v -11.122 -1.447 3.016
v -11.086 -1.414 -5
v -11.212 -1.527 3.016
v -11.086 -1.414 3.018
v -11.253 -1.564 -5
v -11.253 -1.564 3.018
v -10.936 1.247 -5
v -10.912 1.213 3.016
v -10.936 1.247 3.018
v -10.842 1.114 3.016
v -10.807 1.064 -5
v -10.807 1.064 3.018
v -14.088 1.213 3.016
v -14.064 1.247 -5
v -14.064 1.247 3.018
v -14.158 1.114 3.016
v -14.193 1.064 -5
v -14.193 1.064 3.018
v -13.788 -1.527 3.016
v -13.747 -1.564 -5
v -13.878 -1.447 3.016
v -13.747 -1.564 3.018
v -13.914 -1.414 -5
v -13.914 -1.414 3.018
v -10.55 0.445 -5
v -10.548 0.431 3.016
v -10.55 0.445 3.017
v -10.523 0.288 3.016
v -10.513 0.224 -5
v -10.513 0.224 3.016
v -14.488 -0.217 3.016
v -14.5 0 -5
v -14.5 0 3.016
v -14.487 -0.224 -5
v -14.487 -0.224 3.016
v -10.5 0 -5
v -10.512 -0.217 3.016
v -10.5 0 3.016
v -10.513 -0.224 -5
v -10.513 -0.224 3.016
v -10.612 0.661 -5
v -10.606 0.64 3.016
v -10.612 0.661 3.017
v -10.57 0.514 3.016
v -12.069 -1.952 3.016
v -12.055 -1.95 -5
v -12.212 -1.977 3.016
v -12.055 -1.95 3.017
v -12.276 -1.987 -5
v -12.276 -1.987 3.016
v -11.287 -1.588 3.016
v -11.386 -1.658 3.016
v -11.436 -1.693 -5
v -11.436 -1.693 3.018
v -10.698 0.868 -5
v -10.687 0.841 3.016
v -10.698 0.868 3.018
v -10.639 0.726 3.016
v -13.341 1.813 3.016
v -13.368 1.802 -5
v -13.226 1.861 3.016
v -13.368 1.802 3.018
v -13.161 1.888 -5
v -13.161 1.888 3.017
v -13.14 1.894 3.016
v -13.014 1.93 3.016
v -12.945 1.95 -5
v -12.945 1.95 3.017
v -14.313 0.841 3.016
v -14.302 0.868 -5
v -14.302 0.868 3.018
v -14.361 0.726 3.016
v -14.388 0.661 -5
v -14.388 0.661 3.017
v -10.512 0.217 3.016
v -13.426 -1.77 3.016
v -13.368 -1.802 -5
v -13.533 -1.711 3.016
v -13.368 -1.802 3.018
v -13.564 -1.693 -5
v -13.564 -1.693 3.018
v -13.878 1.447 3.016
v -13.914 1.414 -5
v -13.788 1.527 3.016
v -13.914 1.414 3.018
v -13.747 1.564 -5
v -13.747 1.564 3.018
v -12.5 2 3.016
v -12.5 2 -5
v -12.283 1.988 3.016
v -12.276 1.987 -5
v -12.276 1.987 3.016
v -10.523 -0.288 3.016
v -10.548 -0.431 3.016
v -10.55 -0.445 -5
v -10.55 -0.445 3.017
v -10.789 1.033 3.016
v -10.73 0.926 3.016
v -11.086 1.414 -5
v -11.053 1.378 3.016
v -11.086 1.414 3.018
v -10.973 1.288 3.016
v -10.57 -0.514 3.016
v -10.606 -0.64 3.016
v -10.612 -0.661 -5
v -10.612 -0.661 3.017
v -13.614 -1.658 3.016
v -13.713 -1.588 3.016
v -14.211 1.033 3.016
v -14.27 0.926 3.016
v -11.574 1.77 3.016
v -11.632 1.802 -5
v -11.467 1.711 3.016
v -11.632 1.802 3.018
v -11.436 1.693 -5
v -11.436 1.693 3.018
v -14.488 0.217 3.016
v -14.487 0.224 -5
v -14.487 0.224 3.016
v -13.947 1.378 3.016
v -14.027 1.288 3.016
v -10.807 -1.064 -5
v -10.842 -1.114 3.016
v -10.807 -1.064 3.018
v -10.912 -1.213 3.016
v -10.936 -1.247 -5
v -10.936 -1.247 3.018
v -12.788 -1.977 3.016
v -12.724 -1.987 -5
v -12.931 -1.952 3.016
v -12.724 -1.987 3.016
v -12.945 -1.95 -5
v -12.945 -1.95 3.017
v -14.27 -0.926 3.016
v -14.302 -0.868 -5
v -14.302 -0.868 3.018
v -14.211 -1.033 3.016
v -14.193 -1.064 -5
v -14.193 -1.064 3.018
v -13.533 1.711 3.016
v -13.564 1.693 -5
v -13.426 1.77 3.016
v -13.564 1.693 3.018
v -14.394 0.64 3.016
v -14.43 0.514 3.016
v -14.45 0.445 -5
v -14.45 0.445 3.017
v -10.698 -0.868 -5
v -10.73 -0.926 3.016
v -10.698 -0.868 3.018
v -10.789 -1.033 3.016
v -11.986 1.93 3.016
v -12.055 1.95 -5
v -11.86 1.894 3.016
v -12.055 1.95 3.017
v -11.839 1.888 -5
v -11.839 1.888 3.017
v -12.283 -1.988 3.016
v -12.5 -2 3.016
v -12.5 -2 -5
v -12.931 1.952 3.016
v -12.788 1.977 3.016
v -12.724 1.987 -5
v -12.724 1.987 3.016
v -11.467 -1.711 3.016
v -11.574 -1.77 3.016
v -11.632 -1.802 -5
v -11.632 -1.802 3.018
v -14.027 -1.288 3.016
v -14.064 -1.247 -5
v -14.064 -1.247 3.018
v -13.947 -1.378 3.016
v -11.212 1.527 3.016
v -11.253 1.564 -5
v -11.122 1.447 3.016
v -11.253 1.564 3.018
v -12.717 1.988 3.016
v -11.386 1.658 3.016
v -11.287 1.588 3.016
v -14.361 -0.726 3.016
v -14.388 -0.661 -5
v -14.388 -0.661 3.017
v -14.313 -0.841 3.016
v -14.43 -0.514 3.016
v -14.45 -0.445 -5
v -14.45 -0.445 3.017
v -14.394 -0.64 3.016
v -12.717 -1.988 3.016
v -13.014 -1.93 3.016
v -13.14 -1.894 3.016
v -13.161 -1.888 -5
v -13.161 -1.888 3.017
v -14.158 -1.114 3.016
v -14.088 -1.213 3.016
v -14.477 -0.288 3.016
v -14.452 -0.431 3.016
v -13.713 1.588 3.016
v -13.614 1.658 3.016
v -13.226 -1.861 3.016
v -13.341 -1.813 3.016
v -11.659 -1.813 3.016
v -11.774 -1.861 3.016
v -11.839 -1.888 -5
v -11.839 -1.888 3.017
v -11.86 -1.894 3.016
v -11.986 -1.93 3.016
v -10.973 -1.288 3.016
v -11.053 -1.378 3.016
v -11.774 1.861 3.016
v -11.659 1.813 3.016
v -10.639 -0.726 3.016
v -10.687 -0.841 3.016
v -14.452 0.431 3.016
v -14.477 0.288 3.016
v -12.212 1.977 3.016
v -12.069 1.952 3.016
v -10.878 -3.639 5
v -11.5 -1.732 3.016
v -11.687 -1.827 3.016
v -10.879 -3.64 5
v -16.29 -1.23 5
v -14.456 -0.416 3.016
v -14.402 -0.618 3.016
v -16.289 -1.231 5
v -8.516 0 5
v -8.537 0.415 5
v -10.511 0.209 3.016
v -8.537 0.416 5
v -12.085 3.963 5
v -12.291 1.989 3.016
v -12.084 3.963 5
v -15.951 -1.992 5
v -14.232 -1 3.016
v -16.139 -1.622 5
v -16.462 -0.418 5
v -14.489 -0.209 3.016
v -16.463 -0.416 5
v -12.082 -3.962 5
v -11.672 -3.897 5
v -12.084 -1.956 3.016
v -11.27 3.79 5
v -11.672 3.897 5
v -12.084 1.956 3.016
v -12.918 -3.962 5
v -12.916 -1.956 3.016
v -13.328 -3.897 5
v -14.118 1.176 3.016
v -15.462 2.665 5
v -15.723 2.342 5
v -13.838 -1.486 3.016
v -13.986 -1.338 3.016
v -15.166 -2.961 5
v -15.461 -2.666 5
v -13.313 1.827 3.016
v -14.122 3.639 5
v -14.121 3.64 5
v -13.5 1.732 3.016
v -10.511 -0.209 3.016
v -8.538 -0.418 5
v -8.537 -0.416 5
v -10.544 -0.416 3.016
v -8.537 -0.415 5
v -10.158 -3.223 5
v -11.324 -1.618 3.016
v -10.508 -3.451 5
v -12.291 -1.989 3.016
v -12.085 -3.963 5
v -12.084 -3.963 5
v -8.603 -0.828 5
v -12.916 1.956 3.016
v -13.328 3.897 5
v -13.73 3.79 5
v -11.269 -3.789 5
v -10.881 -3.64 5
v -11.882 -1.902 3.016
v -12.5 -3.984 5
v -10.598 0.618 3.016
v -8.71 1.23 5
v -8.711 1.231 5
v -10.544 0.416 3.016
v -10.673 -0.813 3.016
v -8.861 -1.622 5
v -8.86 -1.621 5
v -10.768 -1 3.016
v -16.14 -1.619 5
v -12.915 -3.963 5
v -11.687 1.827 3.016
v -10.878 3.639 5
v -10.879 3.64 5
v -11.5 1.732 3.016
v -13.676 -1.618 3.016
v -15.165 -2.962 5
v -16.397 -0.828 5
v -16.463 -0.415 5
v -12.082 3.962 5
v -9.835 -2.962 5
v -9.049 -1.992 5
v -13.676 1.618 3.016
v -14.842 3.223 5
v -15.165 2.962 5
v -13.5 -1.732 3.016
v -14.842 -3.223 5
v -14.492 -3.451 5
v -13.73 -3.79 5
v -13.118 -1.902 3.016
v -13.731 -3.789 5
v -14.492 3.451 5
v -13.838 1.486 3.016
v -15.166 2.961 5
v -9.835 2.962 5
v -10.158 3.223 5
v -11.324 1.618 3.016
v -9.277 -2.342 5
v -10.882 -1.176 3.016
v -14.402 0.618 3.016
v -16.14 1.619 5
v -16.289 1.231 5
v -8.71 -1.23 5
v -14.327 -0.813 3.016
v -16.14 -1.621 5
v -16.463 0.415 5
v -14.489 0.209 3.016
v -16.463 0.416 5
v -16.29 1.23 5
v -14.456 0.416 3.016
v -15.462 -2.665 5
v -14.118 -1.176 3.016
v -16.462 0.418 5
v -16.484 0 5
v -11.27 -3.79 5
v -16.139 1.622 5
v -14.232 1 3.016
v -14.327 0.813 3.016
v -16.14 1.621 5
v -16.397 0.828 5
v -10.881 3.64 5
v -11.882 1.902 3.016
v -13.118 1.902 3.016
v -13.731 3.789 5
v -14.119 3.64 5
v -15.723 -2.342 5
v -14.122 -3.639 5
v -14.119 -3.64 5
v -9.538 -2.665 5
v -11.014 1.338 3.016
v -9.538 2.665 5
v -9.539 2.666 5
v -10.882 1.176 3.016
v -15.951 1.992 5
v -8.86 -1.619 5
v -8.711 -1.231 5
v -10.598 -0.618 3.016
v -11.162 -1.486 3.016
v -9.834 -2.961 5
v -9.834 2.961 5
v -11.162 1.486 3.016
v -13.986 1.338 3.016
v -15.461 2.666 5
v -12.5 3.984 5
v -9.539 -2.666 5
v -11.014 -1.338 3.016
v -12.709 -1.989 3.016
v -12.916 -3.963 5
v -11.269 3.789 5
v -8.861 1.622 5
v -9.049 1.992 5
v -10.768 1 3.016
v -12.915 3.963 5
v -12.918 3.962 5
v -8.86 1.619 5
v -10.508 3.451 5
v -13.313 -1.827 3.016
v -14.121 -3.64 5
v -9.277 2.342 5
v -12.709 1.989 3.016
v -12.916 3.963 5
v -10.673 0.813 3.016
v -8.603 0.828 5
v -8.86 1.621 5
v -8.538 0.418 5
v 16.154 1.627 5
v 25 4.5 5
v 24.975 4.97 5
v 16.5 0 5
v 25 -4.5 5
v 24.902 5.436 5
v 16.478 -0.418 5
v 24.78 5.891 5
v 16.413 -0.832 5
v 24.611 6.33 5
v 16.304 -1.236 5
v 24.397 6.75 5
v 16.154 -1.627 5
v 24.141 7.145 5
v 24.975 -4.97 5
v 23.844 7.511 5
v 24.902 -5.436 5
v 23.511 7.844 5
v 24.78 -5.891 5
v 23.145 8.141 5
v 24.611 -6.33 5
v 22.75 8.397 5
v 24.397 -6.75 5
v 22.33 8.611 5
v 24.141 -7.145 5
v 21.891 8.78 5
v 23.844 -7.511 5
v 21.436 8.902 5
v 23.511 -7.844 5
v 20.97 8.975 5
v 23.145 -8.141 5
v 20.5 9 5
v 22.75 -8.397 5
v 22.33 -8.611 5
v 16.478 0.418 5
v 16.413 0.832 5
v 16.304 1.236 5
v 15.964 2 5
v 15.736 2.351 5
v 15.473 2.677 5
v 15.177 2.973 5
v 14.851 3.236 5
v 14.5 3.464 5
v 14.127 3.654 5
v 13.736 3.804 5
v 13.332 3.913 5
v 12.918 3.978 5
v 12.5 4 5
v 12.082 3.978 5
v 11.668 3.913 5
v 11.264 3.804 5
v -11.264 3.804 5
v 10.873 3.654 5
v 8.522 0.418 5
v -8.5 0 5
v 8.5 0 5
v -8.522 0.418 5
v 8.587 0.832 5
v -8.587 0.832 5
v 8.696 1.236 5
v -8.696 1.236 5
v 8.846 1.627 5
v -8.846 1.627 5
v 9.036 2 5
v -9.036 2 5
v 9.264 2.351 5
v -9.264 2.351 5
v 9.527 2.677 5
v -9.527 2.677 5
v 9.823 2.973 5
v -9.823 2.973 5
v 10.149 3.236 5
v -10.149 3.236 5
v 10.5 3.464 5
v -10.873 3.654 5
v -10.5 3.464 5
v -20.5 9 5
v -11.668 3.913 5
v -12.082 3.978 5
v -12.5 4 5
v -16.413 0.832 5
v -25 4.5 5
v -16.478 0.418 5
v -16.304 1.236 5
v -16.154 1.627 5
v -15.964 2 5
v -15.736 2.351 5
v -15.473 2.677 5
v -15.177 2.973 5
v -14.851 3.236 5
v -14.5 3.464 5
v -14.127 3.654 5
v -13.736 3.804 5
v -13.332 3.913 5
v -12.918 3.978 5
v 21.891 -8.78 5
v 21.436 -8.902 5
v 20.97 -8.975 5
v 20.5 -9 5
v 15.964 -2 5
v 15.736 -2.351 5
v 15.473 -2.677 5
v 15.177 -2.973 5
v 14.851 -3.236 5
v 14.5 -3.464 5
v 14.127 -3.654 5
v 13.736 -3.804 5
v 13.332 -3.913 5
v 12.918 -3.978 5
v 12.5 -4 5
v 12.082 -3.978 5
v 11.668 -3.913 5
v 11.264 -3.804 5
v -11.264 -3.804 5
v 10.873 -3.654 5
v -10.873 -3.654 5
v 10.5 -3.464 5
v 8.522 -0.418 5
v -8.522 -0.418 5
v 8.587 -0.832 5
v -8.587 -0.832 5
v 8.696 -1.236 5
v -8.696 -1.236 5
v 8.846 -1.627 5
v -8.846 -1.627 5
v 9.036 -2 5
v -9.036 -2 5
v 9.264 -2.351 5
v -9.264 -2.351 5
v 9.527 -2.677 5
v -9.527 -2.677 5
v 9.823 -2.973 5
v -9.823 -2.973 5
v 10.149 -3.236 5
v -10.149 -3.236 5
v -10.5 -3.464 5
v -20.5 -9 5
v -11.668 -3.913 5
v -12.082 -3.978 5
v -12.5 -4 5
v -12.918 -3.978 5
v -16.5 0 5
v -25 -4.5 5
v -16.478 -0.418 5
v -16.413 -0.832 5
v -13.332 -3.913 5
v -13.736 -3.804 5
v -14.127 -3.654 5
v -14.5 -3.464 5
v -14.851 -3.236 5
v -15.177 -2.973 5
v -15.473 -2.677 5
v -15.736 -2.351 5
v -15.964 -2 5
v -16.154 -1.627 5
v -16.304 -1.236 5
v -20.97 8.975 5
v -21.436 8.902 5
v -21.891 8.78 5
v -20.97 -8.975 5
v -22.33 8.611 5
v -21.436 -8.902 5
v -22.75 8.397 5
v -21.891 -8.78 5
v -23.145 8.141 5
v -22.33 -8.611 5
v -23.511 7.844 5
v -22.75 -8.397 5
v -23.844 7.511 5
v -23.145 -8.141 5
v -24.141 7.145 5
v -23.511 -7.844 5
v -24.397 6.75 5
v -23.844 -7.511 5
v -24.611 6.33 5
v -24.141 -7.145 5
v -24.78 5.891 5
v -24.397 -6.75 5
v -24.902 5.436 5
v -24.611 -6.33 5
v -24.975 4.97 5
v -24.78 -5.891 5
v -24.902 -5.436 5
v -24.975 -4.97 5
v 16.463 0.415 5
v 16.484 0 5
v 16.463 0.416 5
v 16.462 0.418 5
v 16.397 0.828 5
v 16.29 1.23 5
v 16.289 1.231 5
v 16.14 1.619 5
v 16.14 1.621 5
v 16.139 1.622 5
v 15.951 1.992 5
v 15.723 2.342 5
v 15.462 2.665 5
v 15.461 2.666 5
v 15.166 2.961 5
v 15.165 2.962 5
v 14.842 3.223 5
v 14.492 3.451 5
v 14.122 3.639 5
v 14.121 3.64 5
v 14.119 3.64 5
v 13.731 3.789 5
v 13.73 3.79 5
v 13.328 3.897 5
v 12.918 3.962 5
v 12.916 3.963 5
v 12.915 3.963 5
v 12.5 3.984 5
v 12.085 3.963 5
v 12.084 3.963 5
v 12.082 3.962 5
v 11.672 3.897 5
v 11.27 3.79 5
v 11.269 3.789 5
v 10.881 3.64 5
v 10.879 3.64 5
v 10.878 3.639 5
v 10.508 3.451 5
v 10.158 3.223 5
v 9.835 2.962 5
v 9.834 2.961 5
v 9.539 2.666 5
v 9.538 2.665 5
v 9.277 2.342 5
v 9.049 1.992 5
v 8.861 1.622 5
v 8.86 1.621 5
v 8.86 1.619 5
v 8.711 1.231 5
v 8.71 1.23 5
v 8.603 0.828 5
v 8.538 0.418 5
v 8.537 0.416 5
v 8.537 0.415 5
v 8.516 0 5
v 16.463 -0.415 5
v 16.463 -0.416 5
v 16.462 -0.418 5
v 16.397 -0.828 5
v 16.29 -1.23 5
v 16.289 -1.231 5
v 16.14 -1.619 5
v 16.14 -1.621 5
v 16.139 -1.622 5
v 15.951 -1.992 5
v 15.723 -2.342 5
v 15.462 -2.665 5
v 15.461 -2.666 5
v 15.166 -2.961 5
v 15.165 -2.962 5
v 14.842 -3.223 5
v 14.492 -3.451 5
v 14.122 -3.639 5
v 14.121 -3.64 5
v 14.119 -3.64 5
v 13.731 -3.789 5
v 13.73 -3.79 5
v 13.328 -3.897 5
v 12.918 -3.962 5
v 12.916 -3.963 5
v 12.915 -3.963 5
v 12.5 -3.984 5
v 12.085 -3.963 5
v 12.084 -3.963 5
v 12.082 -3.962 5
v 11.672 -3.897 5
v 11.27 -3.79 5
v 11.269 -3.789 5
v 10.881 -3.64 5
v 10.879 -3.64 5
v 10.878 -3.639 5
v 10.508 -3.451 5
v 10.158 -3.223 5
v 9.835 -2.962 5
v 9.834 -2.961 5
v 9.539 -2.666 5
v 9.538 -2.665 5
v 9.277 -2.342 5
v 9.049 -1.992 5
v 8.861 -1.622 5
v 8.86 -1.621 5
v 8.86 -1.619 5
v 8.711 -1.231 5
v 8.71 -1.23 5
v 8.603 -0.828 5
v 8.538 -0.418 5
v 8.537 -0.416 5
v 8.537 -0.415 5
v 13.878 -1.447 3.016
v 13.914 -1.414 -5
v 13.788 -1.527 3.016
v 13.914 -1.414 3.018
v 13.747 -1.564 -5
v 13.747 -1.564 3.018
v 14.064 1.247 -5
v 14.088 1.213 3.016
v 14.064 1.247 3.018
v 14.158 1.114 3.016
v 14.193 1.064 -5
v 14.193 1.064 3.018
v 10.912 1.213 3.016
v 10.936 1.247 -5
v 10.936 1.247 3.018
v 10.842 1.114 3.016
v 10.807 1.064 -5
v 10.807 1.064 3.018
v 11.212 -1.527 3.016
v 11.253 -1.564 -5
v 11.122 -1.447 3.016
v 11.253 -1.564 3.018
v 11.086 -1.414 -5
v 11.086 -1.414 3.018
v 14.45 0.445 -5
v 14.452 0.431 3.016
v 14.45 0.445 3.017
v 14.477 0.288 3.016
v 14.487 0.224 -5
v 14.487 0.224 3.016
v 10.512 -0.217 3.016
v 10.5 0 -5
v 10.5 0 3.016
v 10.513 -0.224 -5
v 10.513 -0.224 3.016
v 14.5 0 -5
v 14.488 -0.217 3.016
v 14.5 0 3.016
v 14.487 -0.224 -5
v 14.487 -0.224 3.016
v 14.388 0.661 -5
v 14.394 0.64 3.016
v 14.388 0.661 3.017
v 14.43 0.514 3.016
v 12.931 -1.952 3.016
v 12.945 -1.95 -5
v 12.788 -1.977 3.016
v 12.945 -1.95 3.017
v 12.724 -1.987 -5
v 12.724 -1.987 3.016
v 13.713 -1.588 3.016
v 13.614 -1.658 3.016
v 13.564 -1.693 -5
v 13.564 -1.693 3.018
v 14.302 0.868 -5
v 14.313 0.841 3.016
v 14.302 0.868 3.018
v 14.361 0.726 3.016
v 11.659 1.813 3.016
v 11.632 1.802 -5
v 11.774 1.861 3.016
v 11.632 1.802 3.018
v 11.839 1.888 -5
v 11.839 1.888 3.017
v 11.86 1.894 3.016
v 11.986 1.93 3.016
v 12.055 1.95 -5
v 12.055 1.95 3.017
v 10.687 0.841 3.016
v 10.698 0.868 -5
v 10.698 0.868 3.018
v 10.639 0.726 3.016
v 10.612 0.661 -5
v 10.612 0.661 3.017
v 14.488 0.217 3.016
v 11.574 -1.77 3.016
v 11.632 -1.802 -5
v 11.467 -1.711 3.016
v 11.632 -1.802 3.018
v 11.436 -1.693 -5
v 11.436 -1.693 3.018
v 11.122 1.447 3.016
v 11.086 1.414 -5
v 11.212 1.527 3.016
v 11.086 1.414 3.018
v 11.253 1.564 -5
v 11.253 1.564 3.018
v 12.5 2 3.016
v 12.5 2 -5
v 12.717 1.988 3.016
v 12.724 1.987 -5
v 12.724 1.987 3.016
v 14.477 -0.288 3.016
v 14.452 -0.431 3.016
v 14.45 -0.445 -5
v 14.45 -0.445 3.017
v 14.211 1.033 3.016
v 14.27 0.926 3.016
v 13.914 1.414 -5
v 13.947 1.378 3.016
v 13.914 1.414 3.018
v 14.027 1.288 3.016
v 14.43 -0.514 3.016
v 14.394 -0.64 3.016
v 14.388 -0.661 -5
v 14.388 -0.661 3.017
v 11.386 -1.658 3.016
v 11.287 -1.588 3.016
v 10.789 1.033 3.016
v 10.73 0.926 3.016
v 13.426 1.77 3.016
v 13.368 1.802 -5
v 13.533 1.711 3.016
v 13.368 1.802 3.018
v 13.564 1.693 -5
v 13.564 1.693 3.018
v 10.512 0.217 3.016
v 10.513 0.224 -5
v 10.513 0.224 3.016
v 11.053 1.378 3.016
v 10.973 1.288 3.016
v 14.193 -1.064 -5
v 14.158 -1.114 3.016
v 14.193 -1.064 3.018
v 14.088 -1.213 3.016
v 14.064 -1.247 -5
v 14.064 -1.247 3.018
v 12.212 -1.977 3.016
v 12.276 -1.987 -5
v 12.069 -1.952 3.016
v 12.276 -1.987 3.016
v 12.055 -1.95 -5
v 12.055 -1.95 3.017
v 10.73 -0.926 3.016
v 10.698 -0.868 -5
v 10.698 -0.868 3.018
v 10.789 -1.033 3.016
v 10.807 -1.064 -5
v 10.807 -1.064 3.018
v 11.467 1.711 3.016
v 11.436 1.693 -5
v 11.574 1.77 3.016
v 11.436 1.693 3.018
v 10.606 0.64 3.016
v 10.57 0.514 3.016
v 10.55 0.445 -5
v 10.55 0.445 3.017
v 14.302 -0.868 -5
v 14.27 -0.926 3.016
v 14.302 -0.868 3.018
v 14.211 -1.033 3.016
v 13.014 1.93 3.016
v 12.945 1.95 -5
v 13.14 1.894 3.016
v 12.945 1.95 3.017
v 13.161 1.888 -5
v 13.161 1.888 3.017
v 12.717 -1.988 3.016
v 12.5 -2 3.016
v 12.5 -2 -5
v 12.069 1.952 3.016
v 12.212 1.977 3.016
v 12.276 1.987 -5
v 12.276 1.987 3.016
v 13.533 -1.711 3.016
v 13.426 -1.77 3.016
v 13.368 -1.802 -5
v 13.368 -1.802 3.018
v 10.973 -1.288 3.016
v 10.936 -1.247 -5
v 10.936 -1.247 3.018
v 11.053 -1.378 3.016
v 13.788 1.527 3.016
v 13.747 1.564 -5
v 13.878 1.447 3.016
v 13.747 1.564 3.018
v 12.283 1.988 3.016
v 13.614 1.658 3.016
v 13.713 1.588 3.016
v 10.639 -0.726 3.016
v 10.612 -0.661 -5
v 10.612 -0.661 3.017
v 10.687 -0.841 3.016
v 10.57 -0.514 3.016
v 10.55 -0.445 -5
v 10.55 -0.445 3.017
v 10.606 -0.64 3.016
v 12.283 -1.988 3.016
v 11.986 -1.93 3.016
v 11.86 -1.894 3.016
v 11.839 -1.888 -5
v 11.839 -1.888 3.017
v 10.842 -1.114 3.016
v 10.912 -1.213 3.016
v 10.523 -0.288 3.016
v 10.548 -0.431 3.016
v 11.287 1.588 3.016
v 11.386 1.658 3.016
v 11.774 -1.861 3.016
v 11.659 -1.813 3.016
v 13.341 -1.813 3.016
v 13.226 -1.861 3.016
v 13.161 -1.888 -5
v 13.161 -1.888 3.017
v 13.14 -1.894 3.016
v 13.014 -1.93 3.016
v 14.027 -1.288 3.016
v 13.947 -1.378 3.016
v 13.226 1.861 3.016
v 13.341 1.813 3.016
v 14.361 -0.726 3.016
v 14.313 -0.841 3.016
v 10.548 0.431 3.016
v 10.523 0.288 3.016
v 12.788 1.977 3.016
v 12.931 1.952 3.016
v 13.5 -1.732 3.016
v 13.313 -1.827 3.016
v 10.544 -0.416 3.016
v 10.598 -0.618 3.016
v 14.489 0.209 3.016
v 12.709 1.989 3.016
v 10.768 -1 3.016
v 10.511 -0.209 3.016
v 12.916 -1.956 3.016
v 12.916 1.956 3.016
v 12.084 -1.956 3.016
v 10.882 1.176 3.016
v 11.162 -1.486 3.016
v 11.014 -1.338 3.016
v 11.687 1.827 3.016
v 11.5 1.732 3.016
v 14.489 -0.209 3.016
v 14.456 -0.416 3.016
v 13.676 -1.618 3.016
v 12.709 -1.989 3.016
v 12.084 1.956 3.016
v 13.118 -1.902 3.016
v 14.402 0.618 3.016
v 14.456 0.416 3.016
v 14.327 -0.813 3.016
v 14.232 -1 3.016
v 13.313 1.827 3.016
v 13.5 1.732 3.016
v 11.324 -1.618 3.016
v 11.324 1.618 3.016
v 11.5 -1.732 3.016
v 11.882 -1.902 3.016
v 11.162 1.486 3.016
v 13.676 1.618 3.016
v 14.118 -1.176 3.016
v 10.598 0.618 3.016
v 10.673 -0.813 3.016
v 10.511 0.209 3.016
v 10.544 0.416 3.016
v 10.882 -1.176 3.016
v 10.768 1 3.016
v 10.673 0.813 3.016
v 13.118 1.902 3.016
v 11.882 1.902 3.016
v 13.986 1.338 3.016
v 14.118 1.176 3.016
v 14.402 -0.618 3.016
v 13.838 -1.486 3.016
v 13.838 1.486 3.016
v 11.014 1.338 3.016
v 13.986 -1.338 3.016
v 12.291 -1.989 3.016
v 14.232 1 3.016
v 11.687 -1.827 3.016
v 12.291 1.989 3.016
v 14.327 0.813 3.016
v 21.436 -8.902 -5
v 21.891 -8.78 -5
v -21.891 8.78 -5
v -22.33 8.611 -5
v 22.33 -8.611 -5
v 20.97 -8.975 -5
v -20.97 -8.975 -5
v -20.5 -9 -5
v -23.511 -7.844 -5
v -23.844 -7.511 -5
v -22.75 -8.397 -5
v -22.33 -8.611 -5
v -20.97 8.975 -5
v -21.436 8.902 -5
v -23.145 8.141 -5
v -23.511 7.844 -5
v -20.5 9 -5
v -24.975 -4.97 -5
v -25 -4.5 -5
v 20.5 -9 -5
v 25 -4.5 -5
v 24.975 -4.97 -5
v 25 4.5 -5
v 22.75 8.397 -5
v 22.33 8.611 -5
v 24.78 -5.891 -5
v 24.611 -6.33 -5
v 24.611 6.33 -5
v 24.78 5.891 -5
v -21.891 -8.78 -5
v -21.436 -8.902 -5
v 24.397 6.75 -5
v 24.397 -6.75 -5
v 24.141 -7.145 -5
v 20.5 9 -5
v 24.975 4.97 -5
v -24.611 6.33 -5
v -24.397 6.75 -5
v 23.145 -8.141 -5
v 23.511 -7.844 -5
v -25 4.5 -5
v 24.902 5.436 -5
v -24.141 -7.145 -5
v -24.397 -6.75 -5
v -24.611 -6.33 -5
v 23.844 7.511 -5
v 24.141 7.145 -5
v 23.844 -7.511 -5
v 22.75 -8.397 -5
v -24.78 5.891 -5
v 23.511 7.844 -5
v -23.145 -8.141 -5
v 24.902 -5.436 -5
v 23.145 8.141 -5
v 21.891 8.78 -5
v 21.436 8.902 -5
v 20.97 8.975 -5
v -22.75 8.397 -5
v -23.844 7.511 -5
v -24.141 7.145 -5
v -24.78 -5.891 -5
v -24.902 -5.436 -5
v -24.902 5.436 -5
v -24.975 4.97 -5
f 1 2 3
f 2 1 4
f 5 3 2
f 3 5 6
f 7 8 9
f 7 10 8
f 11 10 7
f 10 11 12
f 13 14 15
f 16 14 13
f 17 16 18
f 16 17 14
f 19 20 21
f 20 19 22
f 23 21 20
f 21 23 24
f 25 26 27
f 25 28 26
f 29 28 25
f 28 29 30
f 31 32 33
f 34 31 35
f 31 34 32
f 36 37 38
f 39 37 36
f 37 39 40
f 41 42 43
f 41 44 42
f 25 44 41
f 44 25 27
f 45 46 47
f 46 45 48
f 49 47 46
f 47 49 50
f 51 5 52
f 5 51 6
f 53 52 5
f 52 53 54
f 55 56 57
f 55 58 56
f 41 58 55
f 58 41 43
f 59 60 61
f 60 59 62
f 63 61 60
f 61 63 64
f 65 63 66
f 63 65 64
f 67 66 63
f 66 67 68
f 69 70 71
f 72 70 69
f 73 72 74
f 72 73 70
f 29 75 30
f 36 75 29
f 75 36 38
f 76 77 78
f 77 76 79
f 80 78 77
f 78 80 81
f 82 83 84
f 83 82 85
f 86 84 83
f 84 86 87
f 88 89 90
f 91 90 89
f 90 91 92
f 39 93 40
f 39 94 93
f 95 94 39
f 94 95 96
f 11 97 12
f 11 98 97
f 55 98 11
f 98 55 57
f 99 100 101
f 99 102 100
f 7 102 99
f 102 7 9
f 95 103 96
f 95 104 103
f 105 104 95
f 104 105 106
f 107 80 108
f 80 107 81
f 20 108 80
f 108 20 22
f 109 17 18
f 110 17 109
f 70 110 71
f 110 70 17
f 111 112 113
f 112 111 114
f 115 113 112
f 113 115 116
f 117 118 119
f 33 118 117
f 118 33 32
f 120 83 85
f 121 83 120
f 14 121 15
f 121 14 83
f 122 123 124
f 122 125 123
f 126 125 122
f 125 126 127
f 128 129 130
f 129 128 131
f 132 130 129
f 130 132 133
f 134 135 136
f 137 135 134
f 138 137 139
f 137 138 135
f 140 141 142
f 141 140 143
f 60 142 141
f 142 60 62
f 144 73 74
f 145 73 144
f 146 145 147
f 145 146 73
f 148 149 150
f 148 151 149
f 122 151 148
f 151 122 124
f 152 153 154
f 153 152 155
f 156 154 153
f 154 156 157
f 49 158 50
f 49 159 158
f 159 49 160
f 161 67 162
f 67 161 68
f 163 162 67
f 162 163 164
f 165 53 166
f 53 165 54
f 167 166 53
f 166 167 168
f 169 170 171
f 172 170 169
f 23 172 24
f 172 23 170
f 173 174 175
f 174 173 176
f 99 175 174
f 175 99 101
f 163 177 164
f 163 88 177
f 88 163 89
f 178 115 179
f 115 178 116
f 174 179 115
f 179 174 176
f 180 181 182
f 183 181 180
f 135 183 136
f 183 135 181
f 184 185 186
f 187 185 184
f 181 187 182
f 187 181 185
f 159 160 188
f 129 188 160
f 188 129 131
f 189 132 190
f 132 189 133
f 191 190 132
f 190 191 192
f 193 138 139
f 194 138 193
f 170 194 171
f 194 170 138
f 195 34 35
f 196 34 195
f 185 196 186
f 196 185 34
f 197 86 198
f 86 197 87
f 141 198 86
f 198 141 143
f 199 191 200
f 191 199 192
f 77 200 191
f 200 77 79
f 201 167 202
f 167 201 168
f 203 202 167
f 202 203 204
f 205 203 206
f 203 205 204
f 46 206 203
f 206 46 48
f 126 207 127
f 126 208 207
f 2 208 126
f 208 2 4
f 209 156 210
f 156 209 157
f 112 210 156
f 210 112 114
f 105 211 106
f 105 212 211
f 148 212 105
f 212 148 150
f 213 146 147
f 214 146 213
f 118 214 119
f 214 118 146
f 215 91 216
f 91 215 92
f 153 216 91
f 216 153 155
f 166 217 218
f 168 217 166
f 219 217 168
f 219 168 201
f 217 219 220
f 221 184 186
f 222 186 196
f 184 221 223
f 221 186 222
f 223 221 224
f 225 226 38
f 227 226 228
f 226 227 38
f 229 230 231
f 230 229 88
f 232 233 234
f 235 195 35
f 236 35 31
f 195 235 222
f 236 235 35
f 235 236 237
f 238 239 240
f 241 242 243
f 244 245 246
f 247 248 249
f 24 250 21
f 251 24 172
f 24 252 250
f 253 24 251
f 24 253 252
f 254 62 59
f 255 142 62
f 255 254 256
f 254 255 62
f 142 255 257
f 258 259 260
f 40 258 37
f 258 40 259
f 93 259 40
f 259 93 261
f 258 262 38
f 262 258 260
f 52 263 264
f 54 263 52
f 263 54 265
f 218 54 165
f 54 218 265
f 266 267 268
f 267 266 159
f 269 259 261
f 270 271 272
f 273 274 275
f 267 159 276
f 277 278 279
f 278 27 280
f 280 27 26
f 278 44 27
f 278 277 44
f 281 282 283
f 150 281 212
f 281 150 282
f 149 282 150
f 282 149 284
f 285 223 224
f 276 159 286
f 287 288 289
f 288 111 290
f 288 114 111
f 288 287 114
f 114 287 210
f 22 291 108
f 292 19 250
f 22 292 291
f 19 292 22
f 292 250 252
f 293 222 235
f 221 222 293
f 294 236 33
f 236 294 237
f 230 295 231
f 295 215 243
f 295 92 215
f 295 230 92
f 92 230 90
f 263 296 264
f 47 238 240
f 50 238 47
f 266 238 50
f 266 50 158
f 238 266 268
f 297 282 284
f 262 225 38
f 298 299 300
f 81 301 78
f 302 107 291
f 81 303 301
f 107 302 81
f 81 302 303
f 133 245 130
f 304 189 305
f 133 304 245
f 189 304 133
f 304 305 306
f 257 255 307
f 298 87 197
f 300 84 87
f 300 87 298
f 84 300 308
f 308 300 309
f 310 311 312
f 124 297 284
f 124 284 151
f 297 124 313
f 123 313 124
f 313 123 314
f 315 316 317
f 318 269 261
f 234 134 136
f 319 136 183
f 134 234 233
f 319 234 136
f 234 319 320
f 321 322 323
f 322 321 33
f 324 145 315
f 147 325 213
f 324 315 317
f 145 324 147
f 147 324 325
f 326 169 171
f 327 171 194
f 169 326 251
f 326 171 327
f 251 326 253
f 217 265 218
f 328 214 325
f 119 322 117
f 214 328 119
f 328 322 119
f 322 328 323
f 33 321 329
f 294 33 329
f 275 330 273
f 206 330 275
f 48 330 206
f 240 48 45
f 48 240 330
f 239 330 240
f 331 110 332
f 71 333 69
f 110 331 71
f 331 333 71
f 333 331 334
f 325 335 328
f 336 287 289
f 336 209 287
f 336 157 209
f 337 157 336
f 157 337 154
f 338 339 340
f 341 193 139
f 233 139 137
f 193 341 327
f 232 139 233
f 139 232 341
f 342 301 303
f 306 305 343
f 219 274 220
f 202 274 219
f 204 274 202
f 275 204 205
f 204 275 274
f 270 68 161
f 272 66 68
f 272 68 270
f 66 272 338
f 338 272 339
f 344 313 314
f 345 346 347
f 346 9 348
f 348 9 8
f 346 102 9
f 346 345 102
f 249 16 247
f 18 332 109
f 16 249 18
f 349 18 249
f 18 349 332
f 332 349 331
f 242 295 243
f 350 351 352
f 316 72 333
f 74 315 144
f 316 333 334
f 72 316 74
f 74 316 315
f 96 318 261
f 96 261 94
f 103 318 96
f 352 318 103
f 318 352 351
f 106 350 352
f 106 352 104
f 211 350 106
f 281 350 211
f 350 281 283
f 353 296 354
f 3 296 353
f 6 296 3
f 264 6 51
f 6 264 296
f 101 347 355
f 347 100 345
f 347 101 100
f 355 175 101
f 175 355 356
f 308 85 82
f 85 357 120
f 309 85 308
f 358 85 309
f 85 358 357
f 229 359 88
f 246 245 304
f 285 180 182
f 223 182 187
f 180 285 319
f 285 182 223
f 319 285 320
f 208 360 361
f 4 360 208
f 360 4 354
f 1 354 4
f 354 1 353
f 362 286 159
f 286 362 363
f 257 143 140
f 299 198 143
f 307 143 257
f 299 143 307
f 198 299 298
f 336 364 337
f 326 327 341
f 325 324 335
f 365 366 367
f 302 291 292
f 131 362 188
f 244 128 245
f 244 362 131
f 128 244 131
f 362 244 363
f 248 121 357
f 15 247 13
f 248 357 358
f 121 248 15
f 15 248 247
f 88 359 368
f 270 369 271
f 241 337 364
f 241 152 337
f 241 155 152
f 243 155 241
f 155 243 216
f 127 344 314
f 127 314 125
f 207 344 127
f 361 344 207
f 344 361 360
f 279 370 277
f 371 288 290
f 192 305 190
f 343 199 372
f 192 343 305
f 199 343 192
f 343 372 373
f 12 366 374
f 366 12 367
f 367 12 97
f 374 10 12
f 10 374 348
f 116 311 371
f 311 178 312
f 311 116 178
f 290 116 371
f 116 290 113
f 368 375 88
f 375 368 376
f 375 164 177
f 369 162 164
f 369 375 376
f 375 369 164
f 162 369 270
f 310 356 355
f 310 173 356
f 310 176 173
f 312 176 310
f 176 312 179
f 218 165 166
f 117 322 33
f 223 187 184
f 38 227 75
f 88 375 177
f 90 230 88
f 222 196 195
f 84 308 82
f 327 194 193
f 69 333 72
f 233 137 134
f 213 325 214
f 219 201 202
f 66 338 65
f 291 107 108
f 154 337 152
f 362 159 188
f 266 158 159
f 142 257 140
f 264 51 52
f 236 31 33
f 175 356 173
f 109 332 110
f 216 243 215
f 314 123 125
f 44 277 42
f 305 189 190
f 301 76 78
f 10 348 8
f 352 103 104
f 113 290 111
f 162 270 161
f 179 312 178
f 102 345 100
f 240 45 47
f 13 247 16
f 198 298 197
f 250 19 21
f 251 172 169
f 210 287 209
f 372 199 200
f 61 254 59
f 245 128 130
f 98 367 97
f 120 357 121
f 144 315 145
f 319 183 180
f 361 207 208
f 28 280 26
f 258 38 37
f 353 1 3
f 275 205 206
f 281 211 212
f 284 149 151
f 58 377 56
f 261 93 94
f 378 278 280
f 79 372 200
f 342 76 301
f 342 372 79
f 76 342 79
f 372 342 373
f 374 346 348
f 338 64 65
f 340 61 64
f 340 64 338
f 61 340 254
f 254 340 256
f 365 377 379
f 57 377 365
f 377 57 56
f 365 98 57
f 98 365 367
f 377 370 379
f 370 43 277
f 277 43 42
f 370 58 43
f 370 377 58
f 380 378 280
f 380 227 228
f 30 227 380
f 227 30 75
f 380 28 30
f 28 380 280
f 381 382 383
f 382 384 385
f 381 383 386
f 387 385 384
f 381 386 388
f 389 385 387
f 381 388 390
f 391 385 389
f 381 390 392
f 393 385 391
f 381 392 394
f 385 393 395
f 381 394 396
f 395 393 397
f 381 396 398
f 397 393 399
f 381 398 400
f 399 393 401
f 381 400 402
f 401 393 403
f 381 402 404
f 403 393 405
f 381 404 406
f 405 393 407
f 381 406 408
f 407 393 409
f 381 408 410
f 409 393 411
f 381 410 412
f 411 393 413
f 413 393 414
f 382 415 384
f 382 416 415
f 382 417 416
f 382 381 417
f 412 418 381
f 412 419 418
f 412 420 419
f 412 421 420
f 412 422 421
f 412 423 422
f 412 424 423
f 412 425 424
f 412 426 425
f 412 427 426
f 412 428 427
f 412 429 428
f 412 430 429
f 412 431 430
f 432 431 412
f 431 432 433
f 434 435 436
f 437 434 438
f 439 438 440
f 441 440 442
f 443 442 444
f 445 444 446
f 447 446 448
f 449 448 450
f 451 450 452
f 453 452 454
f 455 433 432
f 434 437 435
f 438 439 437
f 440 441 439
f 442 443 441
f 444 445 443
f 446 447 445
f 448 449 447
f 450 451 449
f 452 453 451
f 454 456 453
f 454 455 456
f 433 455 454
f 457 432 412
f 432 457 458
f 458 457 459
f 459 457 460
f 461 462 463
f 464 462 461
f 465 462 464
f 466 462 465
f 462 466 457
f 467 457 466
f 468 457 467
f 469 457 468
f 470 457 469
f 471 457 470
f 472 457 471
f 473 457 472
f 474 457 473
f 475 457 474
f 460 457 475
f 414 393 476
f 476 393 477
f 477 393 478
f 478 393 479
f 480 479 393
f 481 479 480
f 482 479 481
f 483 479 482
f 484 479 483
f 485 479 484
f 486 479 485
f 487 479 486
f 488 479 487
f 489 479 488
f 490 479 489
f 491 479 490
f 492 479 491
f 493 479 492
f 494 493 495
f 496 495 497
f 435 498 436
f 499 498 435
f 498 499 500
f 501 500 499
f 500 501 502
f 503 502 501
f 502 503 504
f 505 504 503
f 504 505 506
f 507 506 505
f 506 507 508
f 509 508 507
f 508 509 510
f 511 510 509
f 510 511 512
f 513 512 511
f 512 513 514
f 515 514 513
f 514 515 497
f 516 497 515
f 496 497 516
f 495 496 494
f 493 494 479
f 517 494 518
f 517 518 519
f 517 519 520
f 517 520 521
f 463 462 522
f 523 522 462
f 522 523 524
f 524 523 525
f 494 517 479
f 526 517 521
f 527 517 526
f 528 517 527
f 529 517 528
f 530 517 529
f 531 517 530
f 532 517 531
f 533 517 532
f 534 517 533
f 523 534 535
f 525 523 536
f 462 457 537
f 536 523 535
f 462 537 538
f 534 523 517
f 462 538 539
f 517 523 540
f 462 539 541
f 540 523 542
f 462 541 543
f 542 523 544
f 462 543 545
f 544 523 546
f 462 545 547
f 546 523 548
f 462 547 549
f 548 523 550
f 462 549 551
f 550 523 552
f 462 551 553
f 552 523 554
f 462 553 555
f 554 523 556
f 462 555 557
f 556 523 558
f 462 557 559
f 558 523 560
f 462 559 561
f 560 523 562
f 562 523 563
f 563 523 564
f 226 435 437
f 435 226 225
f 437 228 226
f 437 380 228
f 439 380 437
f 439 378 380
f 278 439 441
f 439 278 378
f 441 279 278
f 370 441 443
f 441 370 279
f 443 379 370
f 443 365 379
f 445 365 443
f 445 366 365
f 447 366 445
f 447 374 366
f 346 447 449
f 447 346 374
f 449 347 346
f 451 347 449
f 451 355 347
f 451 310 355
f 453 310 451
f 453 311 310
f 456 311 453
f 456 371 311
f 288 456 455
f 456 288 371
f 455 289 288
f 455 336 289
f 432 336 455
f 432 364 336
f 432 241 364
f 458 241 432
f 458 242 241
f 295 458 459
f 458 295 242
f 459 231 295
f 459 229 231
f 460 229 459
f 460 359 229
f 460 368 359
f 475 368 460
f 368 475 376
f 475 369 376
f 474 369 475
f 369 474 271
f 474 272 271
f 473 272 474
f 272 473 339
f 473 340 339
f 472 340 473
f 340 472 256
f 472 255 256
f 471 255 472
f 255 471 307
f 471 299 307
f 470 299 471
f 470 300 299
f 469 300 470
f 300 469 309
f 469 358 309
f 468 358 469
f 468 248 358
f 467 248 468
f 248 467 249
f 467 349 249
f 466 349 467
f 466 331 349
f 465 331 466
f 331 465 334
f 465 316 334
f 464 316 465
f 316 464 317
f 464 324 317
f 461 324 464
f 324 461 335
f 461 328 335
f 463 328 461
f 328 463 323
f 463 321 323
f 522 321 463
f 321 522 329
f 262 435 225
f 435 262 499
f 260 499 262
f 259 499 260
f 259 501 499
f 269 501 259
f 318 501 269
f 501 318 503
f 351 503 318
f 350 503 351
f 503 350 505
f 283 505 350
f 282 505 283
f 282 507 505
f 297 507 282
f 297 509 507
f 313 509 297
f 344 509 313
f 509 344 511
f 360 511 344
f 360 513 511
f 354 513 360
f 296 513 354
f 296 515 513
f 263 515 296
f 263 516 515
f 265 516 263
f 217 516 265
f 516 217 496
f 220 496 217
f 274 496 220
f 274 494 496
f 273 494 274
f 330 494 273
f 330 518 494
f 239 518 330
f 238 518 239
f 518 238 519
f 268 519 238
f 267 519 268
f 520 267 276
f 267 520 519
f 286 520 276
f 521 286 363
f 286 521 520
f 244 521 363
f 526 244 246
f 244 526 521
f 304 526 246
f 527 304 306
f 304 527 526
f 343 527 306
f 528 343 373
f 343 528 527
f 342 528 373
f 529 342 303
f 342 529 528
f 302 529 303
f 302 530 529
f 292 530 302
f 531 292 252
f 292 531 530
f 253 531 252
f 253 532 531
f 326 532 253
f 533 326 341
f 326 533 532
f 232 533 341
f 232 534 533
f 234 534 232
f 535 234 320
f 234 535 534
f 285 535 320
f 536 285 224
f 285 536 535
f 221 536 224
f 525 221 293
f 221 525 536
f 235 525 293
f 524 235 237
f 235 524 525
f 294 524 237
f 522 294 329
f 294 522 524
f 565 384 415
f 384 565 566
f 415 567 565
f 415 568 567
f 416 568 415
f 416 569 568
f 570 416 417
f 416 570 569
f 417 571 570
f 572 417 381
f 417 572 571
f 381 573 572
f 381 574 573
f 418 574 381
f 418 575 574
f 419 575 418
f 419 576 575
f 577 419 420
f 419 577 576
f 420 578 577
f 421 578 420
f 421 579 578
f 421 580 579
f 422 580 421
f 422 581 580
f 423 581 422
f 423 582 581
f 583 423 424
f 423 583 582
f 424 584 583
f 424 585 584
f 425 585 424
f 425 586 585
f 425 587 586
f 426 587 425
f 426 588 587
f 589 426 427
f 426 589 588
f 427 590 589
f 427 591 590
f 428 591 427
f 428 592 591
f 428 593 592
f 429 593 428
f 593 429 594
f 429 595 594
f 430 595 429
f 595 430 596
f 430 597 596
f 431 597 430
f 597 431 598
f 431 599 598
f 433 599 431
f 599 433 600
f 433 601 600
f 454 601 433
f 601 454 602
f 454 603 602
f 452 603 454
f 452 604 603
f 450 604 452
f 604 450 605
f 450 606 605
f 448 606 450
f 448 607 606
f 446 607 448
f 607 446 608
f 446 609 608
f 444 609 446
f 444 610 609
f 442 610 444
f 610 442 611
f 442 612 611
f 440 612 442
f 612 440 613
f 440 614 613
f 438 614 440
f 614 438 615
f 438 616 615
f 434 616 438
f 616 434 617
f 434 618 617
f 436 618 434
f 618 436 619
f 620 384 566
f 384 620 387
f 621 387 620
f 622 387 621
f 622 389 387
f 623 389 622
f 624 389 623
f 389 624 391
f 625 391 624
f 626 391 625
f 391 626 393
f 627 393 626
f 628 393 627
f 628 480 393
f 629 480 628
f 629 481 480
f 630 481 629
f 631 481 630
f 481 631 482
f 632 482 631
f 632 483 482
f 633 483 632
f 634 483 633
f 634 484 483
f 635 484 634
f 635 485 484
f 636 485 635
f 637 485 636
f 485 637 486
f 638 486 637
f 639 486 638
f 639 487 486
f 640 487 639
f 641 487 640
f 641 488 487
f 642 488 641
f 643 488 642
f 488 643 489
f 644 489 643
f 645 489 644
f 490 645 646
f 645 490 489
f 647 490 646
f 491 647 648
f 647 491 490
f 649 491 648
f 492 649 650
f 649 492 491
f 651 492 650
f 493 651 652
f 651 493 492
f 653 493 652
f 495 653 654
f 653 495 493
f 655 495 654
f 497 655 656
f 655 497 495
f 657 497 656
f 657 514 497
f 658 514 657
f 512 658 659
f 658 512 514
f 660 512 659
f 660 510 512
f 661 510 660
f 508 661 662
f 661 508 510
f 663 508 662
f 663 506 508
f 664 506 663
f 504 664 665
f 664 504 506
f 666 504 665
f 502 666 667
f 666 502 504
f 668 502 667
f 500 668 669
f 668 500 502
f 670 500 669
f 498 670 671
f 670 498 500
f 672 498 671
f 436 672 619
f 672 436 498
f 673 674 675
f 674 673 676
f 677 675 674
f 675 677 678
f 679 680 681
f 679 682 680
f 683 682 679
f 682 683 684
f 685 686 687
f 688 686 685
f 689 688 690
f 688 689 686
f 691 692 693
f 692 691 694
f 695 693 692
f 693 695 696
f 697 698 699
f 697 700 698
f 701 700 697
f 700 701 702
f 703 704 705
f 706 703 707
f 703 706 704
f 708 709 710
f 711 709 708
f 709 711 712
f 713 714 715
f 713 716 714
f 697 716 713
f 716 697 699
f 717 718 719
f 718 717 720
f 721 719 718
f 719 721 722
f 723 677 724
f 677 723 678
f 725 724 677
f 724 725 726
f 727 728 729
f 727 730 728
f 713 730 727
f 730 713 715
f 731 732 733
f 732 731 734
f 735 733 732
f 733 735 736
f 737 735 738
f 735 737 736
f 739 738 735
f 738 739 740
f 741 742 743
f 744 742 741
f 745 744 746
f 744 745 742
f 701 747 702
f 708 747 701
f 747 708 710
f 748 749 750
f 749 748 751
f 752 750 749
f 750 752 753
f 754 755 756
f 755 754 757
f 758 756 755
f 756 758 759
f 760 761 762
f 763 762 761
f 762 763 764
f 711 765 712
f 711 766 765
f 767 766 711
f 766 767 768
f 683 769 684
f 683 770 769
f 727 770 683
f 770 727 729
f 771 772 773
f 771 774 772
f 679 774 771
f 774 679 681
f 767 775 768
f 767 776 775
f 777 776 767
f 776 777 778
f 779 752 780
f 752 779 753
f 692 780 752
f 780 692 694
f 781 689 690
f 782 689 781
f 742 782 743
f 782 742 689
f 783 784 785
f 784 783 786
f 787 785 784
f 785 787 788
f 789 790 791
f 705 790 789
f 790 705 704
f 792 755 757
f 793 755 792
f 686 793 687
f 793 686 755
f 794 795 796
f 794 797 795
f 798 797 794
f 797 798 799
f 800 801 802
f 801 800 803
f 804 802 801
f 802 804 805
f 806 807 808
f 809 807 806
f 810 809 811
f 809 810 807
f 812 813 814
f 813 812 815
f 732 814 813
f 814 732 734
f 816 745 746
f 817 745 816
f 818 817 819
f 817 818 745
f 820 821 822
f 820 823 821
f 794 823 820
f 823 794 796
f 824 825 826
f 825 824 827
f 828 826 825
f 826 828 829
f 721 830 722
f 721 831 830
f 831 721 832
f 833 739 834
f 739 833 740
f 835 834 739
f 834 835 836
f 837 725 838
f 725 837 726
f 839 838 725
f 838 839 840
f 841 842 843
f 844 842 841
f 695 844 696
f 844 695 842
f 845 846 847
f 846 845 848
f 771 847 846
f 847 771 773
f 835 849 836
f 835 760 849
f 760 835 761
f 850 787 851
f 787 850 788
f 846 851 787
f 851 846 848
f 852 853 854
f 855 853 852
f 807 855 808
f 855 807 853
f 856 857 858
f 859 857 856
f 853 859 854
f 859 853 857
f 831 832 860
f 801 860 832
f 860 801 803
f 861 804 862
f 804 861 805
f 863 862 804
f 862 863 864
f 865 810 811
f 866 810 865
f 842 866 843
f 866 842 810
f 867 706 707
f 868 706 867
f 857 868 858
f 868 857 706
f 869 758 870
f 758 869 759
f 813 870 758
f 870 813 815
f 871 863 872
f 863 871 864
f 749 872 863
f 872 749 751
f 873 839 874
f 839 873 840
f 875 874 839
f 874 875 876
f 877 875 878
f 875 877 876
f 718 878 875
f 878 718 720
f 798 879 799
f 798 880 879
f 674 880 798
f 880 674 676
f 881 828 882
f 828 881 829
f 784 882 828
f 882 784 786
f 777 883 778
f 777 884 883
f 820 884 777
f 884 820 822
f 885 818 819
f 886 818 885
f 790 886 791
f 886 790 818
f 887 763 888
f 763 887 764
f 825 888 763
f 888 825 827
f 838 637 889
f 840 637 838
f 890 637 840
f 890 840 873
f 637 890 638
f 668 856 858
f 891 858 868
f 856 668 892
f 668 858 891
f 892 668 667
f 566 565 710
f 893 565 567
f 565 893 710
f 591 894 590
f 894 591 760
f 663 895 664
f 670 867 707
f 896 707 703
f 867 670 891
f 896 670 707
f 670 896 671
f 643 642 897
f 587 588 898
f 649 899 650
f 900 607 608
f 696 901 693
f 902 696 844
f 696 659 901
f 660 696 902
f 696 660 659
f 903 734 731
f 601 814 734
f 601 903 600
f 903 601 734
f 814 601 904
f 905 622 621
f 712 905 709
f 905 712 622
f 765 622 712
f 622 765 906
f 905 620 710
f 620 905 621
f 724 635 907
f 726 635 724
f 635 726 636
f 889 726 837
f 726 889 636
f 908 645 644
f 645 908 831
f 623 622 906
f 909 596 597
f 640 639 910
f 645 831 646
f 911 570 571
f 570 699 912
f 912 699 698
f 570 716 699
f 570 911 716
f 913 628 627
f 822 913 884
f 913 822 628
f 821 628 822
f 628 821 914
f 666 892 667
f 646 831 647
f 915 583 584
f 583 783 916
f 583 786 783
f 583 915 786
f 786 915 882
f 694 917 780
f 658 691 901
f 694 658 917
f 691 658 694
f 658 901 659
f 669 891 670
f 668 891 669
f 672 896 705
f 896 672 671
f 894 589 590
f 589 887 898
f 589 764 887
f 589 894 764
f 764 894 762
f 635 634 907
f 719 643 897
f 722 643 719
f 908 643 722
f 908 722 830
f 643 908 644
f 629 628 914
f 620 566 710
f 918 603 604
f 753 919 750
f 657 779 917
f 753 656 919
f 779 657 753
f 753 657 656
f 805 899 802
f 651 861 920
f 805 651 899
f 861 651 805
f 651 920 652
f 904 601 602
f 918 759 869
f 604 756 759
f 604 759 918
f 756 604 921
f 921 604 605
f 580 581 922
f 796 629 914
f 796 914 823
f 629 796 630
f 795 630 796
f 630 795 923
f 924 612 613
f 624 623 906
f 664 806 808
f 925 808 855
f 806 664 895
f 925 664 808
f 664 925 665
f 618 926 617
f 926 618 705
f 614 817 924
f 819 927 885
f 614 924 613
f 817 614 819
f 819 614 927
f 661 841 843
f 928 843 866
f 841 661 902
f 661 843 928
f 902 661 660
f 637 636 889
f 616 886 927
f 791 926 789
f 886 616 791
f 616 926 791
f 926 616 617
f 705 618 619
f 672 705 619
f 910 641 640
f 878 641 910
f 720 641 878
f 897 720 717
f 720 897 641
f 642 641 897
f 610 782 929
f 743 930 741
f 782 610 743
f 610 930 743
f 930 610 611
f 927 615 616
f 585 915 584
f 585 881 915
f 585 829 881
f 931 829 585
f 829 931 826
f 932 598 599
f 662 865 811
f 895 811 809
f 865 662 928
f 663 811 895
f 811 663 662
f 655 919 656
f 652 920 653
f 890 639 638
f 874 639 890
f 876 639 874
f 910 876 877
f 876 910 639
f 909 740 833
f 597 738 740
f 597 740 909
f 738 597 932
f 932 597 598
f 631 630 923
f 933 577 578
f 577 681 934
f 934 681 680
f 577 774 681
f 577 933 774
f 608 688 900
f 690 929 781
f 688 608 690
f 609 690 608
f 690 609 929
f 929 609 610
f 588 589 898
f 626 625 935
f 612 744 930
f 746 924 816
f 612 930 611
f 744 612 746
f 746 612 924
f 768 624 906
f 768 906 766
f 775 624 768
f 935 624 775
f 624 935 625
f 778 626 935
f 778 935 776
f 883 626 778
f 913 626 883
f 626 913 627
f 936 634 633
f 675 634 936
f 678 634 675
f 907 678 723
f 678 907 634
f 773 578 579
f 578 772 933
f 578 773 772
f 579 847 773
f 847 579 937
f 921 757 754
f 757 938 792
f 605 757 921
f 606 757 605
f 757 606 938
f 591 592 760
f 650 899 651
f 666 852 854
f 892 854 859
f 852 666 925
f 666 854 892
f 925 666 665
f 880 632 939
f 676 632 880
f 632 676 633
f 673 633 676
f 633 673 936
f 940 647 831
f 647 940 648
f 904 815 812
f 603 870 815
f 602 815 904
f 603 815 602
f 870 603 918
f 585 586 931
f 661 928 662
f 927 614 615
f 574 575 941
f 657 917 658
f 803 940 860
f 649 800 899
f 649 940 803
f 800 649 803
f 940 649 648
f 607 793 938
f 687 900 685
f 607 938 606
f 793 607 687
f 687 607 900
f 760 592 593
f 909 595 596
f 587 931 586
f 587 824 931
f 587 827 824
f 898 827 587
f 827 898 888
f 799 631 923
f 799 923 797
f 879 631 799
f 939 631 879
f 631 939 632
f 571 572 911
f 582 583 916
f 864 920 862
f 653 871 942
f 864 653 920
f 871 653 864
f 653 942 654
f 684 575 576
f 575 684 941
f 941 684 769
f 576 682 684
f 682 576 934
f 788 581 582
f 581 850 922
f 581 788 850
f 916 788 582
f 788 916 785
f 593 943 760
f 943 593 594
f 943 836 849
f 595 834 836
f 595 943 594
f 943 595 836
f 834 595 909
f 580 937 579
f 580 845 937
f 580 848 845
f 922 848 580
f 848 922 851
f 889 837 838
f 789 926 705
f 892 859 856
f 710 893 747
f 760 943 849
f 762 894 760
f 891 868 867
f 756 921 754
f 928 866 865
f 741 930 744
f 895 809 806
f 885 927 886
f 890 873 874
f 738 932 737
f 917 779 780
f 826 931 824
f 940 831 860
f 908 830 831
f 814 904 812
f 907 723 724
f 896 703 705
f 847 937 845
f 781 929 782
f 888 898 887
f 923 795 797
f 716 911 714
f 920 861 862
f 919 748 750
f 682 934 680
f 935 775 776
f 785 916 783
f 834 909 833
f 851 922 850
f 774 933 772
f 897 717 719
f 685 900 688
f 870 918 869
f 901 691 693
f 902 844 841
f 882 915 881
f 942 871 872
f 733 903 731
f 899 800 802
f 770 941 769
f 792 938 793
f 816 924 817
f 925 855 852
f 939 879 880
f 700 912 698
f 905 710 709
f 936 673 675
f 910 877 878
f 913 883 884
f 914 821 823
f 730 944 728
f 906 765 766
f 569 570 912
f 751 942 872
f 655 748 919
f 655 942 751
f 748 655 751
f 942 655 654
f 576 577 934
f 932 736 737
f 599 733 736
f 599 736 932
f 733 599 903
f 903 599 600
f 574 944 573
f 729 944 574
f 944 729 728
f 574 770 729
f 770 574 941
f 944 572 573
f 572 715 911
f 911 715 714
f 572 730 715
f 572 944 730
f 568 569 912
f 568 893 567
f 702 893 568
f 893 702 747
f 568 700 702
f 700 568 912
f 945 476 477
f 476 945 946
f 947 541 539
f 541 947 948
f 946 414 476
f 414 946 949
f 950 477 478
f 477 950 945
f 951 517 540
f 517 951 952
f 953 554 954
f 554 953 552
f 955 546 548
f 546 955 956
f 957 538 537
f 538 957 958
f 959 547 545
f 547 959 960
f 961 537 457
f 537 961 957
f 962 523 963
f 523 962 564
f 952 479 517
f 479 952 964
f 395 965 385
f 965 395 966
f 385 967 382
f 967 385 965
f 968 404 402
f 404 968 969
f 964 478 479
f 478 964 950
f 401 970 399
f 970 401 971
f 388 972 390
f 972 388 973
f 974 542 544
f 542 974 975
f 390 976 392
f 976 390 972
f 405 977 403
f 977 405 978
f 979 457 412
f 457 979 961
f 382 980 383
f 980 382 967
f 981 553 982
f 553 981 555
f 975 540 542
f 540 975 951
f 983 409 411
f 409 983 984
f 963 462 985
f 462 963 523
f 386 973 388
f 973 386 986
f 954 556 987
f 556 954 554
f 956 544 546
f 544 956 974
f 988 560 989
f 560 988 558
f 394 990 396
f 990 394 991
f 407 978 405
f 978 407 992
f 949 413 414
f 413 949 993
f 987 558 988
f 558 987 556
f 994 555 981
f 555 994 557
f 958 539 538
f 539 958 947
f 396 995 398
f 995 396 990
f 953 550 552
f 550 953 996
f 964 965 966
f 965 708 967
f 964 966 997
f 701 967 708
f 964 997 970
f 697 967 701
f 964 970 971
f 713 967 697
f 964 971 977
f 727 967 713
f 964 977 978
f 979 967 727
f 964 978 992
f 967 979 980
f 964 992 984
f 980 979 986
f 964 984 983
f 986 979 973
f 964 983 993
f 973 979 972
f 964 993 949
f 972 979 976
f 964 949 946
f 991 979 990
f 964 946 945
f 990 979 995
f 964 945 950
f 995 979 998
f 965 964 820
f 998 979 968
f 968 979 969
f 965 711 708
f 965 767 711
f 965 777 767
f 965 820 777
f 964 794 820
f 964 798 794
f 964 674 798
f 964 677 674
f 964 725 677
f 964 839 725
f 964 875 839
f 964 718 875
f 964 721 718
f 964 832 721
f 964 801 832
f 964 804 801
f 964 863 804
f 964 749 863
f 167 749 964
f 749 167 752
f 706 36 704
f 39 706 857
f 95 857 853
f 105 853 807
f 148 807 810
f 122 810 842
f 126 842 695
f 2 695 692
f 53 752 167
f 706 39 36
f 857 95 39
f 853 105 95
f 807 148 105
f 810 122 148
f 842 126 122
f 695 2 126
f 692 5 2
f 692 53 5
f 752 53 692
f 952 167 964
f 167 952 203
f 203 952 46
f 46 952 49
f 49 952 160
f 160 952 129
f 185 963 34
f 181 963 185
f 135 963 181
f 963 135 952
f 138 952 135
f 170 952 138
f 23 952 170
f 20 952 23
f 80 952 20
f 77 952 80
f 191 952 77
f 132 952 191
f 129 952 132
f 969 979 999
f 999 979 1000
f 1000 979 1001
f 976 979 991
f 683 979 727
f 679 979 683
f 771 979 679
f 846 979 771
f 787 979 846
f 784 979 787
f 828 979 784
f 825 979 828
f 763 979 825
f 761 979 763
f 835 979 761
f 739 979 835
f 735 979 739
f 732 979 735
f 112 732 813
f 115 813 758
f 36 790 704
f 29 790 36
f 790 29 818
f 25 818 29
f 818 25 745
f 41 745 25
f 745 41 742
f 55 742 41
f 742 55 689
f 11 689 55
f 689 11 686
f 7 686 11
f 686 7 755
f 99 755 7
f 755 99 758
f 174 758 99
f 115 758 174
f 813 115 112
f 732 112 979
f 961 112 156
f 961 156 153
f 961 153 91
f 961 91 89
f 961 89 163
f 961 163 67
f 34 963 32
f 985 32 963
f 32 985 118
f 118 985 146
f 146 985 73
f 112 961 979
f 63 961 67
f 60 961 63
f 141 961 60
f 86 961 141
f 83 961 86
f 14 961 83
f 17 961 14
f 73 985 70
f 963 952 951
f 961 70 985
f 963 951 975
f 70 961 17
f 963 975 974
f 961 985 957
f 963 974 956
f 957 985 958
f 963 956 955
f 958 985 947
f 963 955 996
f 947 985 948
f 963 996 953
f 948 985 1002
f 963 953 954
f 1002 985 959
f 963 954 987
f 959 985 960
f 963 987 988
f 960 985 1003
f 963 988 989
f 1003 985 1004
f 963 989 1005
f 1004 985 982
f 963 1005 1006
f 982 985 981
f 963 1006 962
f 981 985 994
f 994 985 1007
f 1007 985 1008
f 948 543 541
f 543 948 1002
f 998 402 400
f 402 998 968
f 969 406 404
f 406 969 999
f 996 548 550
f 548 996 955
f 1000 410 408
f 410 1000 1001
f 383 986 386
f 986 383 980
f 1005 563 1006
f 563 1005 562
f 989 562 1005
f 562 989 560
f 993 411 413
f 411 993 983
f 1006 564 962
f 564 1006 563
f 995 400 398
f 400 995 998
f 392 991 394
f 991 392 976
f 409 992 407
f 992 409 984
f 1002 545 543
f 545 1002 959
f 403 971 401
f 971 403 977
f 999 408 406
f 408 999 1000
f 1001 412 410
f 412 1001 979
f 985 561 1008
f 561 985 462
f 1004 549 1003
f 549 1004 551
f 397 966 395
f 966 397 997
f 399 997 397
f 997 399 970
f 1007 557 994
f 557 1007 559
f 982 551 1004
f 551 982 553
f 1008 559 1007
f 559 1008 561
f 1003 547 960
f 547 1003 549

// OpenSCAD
// file: ../../globals.scad
//$fa = $preview? 12 : 6;
//$fs = $preview? 2 : 0.2;

EPS = 1/64;

// Used for indexing coordinates since the dot syntax is not
// officialy supported
X = 0;
Y = 1;
Z = 2;

// Slicer defaults
LAYER_HEIGHT = 0.15;
EXTRUSION_WIDTH = 0.45;

function nearest_layer_height(n) = round(n / LAYER_HEIGHT) * LAYER_HEIGHT;
function nearest_extrusion_width(n) = round(n / EXTRUSION_WIDTH) * EXTRUSION_WIDTH;

// Defaults for all parts
WALL_XS = nearest_extrusion_width(1.25);
WALL_S = nearest_extrusion_width(2);
WALL = nearest_extrusion_width(3);
WALL_L = nearest_extrusion_width(5);
WALL_XL = nearest_extrusion_width(7.5);

// Seems to be a good middle ground, corresponds to #8 for imperial ones
SCREW = 4;

// Set up OpenSCAD rendering defaults
$fa = 6;
$fs = EXTRUSION_WIDTH / 2;

function default(v, d) = is_undef(v)? d : v;

// For engraving in all planes except those parrallel to XY.
module v_engrave(t, size=10) {
    translate([0, 0.3, 0])
    rotate([90,0,0])
    linear_extrude(0.3 + EPS)
    text(t, size=size, font="DejaVu Sans:style=Book", valign="center", halign="center", $fn=8);
}

// For engraving in all planes parrallel to XY.
module h_engrave(t, size=10) {
    translate([0, 0, -0.7])
    linear_extrude(0.7 + EPS)
    text(t, size=size, font="DejaVu Sans:style=Book", valign="center", halign="center", $fn=8);
}

// Used for creating screw holes
module screw(height, head_extra_height=0) {
    translate([0,0, -(height + head_extra_height) / 2]) {
        cylinder(height, r=SCREW/2);
        
        translate([0,0,height-SCREW/2])
        cylinder(SCREW/2, r1=SCREW/2, r2=SCREW);
        
        translate([0,0,height - EPS])
        cylinder(head_extra_height + EPS, r=SCREW);
    }
}
// main file
include <../../globals.scad>;

use <../../dim.scad>;

//W: The width of the spacer
WIDTH = 18;

//H: The height of the spacer
HEIGHT = 10;

module screwed_spacer(width, height, length=50) {
    r = min(width, length) / 4;
    
    difference() {
        linear_extrude(height, center=true)
        offset(r=r)
        offset(delta=-r)
        square([length, width], center=true);

        translate([-length/4, 0])
        screw(height + 2*EPS);

        translate([length/4, 0])
        screw(height + 2*EPS);
    }
    
    translate([length/2 -r, 0])
    dim_y(width, "W", r);

    translate([-length/2, -width/2])   
    dim_z(height, "H");
    
    translate([0,0,height/2])
    dim_x(2*length/4);
}

screwed_spacer(WIDTH, HEIGHT);
